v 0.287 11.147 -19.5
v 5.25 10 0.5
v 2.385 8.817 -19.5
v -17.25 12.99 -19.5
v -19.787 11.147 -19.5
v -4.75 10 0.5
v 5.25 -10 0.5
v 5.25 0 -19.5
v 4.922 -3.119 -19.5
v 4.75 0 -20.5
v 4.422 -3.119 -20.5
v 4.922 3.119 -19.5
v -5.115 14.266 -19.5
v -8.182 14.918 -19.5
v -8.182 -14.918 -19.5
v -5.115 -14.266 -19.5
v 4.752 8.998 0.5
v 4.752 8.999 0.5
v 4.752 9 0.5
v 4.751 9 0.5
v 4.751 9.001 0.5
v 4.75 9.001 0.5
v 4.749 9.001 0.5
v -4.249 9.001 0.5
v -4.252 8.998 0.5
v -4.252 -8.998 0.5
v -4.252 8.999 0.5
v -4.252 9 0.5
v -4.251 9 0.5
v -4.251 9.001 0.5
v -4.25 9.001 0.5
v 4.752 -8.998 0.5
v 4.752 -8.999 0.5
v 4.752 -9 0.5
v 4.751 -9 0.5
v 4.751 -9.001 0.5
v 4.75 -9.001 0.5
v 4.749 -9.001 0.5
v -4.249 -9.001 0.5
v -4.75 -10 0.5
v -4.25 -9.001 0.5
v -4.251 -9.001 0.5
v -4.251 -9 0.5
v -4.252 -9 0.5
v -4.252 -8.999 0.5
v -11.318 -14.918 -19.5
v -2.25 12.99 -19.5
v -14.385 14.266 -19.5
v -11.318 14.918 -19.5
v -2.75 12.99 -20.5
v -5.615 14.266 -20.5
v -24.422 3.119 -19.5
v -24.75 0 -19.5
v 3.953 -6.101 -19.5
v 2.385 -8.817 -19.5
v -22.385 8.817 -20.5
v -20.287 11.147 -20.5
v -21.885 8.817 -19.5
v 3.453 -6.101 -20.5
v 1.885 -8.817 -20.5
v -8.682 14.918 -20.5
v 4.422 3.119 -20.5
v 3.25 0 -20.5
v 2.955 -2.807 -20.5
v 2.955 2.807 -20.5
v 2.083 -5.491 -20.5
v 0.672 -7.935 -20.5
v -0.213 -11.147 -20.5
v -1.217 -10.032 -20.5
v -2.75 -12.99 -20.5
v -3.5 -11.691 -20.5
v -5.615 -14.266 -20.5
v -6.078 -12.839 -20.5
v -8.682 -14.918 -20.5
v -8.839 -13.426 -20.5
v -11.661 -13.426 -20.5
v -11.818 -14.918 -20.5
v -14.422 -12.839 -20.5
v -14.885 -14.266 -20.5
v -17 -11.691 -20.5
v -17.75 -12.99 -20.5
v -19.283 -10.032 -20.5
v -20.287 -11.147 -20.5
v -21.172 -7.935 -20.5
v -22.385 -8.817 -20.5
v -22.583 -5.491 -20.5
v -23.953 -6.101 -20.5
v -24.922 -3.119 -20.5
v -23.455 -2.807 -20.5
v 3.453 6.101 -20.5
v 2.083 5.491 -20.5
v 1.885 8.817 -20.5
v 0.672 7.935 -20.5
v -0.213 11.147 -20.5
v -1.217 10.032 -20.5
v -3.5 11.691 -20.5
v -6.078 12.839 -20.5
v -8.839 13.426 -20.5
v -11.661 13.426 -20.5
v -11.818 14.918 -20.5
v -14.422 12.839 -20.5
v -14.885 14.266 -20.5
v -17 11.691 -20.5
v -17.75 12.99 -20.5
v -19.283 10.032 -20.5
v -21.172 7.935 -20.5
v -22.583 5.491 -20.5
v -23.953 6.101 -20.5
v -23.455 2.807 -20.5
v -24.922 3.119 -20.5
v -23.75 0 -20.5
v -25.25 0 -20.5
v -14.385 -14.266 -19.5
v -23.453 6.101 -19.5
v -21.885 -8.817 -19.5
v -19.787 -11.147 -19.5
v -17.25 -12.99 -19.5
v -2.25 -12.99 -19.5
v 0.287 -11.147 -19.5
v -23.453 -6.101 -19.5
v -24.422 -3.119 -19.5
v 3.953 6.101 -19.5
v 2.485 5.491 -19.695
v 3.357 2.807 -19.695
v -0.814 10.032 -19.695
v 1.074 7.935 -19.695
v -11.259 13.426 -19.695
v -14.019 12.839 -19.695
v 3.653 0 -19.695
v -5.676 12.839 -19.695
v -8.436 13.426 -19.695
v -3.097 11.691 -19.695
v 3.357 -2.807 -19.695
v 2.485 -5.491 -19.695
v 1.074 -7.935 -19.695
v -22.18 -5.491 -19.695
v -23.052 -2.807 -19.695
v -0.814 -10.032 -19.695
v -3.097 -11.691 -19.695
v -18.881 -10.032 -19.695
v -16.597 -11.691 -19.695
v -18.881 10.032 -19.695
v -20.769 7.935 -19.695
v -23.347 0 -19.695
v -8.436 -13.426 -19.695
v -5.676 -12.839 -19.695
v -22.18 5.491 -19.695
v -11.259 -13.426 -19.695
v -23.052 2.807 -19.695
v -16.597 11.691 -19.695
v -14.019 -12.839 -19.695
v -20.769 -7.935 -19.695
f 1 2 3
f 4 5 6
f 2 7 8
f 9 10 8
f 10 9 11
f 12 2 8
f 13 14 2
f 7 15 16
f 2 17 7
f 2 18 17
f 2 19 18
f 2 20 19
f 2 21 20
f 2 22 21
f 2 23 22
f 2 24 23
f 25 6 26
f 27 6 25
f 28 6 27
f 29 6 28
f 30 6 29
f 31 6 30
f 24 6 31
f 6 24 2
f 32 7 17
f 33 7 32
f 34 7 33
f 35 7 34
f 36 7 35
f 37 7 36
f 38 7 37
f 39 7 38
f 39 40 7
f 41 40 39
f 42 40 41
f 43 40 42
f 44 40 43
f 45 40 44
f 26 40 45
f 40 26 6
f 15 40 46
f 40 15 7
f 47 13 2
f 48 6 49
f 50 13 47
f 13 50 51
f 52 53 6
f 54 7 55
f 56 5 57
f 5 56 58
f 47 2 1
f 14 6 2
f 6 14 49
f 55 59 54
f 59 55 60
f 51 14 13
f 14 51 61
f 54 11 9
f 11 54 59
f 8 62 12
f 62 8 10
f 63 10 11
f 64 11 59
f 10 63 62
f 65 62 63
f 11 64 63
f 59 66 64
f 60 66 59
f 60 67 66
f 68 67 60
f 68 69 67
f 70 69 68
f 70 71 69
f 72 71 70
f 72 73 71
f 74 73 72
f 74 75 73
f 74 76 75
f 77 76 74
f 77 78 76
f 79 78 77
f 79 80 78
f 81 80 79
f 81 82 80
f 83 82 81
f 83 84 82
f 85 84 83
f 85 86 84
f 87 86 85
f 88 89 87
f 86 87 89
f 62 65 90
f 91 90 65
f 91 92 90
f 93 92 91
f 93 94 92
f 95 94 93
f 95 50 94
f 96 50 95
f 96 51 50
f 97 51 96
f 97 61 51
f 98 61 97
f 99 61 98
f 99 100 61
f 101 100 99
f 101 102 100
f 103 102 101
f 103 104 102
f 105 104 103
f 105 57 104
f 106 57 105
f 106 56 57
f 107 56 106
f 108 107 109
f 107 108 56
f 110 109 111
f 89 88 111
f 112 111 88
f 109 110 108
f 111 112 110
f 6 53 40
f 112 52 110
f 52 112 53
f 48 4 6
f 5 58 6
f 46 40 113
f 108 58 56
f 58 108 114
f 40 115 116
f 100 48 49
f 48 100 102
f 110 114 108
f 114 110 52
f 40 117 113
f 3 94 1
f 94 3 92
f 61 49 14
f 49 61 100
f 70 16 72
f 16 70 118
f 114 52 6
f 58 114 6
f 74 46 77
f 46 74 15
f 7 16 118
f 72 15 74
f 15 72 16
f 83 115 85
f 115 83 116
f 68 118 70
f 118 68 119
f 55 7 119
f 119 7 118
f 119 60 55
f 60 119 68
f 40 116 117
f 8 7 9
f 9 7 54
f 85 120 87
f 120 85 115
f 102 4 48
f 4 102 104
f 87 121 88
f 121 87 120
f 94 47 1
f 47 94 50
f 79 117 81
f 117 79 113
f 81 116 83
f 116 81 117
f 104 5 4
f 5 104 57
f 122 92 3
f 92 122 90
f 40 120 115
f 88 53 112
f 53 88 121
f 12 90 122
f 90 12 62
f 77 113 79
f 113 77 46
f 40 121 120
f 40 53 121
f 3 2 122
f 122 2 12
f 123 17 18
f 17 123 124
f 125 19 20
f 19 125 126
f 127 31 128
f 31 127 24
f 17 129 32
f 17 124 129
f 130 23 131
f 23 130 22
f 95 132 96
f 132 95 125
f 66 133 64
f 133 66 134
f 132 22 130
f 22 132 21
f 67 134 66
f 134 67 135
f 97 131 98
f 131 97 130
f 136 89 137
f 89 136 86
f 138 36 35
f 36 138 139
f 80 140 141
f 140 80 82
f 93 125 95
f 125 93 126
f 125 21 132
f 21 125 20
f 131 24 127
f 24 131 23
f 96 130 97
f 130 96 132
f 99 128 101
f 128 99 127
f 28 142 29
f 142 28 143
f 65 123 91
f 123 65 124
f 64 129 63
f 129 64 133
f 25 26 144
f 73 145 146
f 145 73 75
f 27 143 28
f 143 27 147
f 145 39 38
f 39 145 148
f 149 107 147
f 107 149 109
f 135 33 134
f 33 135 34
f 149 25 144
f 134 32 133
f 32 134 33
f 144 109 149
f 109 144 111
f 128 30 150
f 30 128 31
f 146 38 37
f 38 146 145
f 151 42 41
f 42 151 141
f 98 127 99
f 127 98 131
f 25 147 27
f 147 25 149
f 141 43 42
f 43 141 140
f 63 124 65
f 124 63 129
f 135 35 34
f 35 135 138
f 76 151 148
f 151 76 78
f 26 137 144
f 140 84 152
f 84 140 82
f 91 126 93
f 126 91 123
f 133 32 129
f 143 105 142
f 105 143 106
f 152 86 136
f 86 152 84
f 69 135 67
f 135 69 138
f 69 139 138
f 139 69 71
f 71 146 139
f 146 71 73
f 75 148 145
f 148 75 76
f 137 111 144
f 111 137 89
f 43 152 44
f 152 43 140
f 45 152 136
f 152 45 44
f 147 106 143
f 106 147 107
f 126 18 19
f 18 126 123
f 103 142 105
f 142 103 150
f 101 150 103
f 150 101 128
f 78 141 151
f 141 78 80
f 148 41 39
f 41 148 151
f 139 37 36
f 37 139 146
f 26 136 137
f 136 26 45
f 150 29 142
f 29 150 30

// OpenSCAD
module duct_form() {
	// let square and circle shaped ends flow into each other
	hull() {
		cube([10, 20, 1], center = true);
		translate([0, 0, -20])
			cylinder(d = 30, h = 1, center = true);
	}
}

module duct() {
	// hollow out the interiour to get a duct
	difference() {
		duct_form();
		scale([0.9, 0.9, 1.01])
			duct_form();
	}
}

// skew
multmatrix(m = [[1, 0, 0.5, 0],
[0, 1, 0, 0],
[0, 0, 1, 0],
[0, 0, 0, 1],
]) duct();
